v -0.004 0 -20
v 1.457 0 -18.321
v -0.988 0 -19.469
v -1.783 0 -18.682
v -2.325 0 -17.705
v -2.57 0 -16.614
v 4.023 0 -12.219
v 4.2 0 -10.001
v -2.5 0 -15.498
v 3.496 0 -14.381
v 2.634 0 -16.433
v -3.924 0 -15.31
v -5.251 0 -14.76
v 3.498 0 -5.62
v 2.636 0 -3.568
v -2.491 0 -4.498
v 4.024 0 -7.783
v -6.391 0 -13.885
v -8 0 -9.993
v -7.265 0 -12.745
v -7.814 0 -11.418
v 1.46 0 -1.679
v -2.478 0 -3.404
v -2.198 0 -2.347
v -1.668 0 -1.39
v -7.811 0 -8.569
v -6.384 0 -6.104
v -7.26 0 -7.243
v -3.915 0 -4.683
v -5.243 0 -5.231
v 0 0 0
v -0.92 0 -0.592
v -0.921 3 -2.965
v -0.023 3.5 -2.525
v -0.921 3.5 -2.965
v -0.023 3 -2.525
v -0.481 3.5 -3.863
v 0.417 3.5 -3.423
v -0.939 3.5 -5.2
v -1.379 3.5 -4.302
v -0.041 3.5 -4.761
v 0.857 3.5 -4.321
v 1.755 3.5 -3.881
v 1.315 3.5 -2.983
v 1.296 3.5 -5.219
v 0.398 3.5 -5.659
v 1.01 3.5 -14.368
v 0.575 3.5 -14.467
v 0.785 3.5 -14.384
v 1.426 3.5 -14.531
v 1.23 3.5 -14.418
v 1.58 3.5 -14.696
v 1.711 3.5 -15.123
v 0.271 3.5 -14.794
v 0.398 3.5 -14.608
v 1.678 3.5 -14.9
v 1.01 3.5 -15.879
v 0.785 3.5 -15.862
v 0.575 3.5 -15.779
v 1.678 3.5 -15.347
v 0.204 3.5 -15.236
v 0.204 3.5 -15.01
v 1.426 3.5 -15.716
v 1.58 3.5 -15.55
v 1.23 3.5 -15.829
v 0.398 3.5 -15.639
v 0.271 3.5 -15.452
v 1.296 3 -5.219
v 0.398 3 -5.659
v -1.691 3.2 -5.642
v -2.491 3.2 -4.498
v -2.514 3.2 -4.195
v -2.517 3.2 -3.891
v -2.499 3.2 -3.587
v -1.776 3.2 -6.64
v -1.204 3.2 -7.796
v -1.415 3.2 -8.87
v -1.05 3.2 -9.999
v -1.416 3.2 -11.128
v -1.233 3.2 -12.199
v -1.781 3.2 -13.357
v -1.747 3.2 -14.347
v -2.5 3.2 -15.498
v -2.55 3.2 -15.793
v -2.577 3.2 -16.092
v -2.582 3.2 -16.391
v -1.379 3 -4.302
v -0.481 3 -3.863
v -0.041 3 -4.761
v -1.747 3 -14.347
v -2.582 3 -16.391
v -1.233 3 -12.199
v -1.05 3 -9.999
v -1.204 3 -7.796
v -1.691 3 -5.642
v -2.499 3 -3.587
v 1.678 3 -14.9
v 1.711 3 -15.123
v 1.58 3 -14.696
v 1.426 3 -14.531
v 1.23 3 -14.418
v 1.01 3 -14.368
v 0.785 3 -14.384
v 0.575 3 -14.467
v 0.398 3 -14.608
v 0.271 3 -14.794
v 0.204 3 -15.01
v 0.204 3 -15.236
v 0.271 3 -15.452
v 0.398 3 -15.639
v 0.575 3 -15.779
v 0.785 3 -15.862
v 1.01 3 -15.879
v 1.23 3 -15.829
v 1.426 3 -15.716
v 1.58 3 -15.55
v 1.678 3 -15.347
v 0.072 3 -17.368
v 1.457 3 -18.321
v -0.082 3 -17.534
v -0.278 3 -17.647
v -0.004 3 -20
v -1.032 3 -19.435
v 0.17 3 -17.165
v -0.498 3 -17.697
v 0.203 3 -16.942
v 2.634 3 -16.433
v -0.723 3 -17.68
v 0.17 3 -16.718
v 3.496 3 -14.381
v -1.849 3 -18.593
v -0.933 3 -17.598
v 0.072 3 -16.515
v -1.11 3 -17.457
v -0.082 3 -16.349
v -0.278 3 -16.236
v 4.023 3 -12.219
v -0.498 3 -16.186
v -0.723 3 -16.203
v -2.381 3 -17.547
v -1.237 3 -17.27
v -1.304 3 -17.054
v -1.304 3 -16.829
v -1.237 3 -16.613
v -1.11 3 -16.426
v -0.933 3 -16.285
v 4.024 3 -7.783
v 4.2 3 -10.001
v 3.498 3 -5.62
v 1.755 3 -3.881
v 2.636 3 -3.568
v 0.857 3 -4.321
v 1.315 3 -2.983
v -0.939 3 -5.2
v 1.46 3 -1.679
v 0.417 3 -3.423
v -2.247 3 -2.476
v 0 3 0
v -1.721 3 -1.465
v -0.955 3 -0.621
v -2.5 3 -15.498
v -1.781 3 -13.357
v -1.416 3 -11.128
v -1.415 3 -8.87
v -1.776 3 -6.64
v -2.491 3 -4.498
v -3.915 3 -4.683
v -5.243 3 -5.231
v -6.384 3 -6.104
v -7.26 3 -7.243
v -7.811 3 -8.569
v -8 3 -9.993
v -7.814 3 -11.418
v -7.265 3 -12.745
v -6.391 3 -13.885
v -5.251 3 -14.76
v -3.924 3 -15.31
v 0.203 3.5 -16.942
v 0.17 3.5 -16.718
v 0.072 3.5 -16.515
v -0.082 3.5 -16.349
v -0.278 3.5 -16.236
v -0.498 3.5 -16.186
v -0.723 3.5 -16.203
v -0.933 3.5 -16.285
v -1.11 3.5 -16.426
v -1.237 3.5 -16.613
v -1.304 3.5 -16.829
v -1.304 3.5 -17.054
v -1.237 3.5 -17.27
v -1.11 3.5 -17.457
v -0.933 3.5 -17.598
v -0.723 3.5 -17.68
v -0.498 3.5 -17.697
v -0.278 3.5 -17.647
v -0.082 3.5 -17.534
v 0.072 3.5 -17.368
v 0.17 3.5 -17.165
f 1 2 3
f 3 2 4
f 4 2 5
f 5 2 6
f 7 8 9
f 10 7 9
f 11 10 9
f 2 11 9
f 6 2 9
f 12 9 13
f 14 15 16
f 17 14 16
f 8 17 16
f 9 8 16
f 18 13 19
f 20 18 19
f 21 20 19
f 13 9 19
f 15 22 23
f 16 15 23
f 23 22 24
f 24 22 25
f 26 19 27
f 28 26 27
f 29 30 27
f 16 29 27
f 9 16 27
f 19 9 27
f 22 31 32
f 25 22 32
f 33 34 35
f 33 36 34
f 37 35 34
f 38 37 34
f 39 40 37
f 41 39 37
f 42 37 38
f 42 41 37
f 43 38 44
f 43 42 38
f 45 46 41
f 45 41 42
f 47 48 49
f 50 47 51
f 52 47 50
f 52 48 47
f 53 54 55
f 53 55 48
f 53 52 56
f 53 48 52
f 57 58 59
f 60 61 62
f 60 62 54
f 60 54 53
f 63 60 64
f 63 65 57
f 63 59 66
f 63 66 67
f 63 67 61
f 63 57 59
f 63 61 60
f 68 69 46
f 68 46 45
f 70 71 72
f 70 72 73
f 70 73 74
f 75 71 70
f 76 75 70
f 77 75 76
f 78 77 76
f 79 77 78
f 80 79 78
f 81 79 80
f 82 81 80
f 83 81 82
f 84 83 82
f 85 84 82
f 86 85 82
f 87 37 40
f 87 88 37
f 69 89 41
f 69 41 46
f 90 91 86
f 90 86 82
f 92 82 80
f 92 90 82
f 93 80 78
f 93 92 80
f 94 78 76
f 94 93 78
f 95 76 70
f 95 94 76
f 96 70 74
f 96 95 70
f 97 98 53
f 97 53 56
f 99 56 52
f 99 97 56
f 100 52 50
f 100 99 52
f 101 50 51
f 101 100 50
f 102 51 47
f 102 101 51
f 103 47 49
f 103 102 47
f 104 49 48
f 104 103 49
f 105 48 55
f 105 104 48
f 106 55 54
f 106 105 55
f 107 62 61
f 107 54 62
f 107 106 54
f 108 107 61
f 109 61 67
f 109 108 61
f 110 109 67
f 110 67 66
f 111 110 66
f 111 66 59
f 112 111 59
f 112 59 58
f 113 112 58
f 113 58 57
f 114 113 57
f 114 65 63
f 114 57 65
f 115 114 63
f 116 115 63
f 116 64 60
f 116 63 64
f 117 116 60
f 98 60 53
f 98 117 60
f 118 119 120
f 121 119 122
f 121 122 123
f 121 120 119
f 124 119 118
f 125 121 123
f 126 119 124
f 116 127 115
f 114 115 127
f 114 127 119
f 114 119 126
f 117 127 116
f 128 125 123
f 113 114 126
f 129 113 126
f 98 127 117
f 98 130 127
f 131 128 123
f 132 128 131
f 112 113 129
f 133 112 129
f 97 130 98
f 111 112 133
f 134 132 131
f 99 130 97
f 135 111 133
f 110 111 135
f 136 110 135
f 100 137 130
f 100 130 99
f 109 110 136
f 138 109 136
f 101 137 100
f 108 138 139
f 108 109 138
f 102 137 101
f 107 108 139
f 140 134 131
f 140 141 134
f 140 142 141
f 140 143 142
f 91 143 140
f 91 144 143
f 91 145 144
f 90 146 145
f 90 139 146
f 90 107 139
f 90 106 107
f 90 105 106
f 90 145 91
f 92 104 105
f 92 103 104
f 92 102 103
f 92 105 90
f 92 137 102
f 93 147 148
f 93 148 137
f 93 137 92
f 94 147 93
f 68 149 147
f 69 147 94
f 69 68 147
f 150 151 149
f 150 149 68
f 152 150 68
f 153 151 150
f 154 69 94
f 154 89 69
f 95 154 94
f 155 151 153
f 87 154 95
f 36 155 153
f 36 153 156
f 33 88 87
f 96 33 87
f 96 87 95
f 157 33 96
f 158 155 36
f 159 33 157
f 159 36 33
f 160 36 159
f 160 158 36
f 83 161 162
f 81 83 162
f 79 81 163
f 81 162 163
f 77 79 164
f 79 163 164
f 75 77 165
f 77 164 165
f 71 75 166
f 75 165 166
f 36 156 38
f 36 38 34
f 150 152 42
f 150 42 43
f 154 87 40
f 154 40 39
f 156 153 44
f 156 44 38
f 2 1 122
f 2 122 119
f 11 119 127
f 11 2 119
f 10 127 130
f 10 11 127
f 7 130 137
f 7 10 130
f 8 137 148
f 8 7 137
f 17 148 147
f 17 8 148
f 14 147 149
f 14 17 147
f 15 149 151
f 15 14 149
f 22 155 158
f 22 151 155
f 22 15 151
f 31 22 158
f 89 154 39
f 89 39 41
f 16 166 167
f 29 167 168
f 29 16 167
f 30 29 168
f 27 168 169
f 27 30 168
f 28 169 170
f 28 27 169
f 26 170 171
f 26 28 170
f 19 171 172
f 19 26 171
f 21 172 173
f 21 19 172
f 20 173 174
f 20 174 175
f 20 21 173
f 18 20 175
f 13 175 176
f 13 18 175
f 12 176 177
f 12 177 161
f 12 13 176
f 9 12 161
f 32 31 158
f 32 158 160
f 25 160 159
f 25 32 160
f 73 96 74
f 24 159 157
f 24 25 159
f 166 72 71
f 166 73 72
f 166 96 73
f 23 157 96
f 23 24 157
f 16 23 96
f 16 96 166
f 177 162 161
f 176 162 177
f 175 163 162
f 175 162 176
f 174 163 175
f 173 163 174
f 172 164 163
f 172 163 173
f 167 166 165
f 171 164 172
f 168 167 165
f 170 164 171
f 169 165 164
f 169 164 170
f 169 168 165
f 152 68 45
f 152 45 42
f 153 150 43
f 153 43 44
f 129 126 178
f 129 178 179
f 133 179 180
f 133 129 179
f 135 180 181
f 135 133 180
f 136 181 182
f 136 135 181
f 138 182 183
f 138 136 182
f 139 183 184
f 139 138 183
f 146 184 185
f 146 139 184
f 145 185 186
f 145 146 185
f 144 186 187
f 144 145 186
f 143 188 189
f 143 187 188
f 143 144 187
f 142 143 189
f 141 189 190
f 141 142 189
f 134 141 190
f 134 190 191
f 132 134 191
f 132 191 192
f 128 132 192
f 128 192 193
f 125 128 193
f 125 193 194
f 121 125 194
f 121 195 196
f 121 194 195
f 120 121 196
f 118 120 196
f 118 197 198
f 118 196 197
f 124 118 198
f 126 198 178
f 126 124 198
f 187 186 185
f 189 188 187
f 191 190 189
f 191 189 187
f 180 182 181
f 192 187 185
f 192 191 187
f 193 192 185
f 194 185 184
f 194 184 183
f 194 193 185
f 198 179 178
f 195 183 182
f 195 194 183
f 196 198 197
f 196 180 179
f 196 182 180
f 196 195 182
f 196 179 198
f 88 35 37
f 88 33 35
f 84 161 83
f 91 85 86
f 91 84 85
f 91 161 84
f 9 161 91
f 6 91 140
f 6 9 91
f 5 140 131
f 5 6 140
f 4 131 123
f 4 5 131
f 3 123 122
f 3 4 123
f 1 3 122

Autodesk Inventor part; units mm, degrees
ref_plane "YZ Plane" through (0, 0, 0) normal (1, 0, 0) x (0, 1, 0)
ref_plane "XZ Plane" through (0, 0, 0) normal (0, 1, 0) x (-1, 0, 0)
ref_plane "XY Plane" through (0, 0, 0) normal (0, 0, 1) x (1, 0, 0)
sketch "Sketch3" plane through (0, 0, 0) normal (0, 1, 0) x (-1, 0, 0)
  arc A0 (0, 0) -> (0.0041, -20) centre (9.8, -9.998) ccw
  arc A1 (0.1922, -14.9904) -> (0.2252, -4.9905) centre (2.5, -9.998) ccw
  arc A2 (2.4909, -4.498) -> (0, 0) centre (-1.9245, -4.0045) ccw
  line L0 (9.8, -9.998) -> (2.5, -9.998)
  arc A3 (0.0041, -20) -> (2.5, -15.498) centre (-1.3582, -16.3019) ccw
  dimension "d4" = 20
  dimension "d7" = 10
  dimension "d10" = 7.3
  dimension "d11" = 0
  dimension "d12" = 2.5
  dimension "d13" = 5.5
extrude "Extrusion1" add sketch "Sketch3" along normal blind 3
sketch "Sketch4" plane through (0, 3, 0) normal (0, 1, 0) x (1, 0, 0)
  arc A0 (-2.4909, 4.498) -> (0, 0) centre (1.9245, 4.0045) ccw projected
  arc A1 (-0.0041, 20) -> (-2.5, 15.498) centre (1.3582, 16.3019) ccw projected
  line L0 (0, 0) -> (-0.0041, 20) construction
  circle A2 centre (-0.5544, 16.9415) radius 0.7578
  circle A3 centre (0.9535, 15.1232) radius 0.7578
  line L1 (-1.3792, 4.3024) -> (-0.9394, 5.2005)
  line L2 (-1.3792, 4.3024) -> (-0.4332, 4.6265) construction
  line L3 (-0.9394, 5.2005) -> (-0.0413, 4.7608)
  line L4 (-0.0413, 4.7608) -> (0.3984, 5.6589)
  line L5 (0.3984, 5.6589) -> (1.2965, 5.2191)
  line L6 (1.2965, 5.2191) -> (0.8568, 4.321)
  line L7 (0.8568, 4.321) -> (1.7549, 3.8812)
  line L8 (1.7549, 3.8812) -> (1.3151, 2.9831)
  line L9 (1.3151, 2.9831) -> (0.417, 3.4229)
  line L10 (0.417, 3.4229) -> (-0.0228, 2.5248)
  line L11 (-0.0228, 2.5248) -> (-0.9209, 2.9646)
  line L12 (-0.9209, 2.9646) -> (-0.4811, 3.8627)
  line L13 (-0.4811, 3.8627) -> (-1.3792, 4.3024)
  dimension "d20" = 1
  dimension "d21" = 45
  dimension "d22" = 1
  dimension "d24" = 1
  dimension "d25" = 1
  dimension "d26" = 1
  dimension "d27" = 1
  dimension "d28" = 1
  dimension "d29" = 1
  dimension "d30" = 1
  dimension "d32" = 1
  dimension "d33" = 1
extrude "Extrusion2" add sketch "Sketch4" along normal blind 0.5
sketch "Sketch5" plane through (0, 3, 0) normal (0, 1, 0) x (1, 0, 0)
  arc A0 (-2.5, 15.498) -> (-2.4909, 4.498) centre (-2.5, 9.998) ccw projected
  arc A1 (-2.4909, 4.498) -> (0, 0) centre (1.9245, 4.0045) ccw projected
  arc A2 (-0.0041, 20) -> (-2.5, 15.498) centre (1.3582, 16.3019) ccw projected
  arc A3 (-2.4909, 4.498) -> (-2.5, 15.498) centre (-15.3699, 9.9874) ccw
  arc A4 (-2.4988, 3.5873) -> (-2.5818, 16.3912) centre (-15.5502, 9.9049) ccw
  point P0 (-1.3699, 9.9989)
  point P1 (-1.0505, 9.9989)
  dimension "d37" = 14
  dimension "d38" = 14.5
  dimension "d39" = 0
  dimension "d40" = 0.3194
extrude "Extrusion3" add sketch "Sketch5" along normal blind 0.2 contours A2 A4 A1 A3
properties part number "Alien tomadagi base design"
